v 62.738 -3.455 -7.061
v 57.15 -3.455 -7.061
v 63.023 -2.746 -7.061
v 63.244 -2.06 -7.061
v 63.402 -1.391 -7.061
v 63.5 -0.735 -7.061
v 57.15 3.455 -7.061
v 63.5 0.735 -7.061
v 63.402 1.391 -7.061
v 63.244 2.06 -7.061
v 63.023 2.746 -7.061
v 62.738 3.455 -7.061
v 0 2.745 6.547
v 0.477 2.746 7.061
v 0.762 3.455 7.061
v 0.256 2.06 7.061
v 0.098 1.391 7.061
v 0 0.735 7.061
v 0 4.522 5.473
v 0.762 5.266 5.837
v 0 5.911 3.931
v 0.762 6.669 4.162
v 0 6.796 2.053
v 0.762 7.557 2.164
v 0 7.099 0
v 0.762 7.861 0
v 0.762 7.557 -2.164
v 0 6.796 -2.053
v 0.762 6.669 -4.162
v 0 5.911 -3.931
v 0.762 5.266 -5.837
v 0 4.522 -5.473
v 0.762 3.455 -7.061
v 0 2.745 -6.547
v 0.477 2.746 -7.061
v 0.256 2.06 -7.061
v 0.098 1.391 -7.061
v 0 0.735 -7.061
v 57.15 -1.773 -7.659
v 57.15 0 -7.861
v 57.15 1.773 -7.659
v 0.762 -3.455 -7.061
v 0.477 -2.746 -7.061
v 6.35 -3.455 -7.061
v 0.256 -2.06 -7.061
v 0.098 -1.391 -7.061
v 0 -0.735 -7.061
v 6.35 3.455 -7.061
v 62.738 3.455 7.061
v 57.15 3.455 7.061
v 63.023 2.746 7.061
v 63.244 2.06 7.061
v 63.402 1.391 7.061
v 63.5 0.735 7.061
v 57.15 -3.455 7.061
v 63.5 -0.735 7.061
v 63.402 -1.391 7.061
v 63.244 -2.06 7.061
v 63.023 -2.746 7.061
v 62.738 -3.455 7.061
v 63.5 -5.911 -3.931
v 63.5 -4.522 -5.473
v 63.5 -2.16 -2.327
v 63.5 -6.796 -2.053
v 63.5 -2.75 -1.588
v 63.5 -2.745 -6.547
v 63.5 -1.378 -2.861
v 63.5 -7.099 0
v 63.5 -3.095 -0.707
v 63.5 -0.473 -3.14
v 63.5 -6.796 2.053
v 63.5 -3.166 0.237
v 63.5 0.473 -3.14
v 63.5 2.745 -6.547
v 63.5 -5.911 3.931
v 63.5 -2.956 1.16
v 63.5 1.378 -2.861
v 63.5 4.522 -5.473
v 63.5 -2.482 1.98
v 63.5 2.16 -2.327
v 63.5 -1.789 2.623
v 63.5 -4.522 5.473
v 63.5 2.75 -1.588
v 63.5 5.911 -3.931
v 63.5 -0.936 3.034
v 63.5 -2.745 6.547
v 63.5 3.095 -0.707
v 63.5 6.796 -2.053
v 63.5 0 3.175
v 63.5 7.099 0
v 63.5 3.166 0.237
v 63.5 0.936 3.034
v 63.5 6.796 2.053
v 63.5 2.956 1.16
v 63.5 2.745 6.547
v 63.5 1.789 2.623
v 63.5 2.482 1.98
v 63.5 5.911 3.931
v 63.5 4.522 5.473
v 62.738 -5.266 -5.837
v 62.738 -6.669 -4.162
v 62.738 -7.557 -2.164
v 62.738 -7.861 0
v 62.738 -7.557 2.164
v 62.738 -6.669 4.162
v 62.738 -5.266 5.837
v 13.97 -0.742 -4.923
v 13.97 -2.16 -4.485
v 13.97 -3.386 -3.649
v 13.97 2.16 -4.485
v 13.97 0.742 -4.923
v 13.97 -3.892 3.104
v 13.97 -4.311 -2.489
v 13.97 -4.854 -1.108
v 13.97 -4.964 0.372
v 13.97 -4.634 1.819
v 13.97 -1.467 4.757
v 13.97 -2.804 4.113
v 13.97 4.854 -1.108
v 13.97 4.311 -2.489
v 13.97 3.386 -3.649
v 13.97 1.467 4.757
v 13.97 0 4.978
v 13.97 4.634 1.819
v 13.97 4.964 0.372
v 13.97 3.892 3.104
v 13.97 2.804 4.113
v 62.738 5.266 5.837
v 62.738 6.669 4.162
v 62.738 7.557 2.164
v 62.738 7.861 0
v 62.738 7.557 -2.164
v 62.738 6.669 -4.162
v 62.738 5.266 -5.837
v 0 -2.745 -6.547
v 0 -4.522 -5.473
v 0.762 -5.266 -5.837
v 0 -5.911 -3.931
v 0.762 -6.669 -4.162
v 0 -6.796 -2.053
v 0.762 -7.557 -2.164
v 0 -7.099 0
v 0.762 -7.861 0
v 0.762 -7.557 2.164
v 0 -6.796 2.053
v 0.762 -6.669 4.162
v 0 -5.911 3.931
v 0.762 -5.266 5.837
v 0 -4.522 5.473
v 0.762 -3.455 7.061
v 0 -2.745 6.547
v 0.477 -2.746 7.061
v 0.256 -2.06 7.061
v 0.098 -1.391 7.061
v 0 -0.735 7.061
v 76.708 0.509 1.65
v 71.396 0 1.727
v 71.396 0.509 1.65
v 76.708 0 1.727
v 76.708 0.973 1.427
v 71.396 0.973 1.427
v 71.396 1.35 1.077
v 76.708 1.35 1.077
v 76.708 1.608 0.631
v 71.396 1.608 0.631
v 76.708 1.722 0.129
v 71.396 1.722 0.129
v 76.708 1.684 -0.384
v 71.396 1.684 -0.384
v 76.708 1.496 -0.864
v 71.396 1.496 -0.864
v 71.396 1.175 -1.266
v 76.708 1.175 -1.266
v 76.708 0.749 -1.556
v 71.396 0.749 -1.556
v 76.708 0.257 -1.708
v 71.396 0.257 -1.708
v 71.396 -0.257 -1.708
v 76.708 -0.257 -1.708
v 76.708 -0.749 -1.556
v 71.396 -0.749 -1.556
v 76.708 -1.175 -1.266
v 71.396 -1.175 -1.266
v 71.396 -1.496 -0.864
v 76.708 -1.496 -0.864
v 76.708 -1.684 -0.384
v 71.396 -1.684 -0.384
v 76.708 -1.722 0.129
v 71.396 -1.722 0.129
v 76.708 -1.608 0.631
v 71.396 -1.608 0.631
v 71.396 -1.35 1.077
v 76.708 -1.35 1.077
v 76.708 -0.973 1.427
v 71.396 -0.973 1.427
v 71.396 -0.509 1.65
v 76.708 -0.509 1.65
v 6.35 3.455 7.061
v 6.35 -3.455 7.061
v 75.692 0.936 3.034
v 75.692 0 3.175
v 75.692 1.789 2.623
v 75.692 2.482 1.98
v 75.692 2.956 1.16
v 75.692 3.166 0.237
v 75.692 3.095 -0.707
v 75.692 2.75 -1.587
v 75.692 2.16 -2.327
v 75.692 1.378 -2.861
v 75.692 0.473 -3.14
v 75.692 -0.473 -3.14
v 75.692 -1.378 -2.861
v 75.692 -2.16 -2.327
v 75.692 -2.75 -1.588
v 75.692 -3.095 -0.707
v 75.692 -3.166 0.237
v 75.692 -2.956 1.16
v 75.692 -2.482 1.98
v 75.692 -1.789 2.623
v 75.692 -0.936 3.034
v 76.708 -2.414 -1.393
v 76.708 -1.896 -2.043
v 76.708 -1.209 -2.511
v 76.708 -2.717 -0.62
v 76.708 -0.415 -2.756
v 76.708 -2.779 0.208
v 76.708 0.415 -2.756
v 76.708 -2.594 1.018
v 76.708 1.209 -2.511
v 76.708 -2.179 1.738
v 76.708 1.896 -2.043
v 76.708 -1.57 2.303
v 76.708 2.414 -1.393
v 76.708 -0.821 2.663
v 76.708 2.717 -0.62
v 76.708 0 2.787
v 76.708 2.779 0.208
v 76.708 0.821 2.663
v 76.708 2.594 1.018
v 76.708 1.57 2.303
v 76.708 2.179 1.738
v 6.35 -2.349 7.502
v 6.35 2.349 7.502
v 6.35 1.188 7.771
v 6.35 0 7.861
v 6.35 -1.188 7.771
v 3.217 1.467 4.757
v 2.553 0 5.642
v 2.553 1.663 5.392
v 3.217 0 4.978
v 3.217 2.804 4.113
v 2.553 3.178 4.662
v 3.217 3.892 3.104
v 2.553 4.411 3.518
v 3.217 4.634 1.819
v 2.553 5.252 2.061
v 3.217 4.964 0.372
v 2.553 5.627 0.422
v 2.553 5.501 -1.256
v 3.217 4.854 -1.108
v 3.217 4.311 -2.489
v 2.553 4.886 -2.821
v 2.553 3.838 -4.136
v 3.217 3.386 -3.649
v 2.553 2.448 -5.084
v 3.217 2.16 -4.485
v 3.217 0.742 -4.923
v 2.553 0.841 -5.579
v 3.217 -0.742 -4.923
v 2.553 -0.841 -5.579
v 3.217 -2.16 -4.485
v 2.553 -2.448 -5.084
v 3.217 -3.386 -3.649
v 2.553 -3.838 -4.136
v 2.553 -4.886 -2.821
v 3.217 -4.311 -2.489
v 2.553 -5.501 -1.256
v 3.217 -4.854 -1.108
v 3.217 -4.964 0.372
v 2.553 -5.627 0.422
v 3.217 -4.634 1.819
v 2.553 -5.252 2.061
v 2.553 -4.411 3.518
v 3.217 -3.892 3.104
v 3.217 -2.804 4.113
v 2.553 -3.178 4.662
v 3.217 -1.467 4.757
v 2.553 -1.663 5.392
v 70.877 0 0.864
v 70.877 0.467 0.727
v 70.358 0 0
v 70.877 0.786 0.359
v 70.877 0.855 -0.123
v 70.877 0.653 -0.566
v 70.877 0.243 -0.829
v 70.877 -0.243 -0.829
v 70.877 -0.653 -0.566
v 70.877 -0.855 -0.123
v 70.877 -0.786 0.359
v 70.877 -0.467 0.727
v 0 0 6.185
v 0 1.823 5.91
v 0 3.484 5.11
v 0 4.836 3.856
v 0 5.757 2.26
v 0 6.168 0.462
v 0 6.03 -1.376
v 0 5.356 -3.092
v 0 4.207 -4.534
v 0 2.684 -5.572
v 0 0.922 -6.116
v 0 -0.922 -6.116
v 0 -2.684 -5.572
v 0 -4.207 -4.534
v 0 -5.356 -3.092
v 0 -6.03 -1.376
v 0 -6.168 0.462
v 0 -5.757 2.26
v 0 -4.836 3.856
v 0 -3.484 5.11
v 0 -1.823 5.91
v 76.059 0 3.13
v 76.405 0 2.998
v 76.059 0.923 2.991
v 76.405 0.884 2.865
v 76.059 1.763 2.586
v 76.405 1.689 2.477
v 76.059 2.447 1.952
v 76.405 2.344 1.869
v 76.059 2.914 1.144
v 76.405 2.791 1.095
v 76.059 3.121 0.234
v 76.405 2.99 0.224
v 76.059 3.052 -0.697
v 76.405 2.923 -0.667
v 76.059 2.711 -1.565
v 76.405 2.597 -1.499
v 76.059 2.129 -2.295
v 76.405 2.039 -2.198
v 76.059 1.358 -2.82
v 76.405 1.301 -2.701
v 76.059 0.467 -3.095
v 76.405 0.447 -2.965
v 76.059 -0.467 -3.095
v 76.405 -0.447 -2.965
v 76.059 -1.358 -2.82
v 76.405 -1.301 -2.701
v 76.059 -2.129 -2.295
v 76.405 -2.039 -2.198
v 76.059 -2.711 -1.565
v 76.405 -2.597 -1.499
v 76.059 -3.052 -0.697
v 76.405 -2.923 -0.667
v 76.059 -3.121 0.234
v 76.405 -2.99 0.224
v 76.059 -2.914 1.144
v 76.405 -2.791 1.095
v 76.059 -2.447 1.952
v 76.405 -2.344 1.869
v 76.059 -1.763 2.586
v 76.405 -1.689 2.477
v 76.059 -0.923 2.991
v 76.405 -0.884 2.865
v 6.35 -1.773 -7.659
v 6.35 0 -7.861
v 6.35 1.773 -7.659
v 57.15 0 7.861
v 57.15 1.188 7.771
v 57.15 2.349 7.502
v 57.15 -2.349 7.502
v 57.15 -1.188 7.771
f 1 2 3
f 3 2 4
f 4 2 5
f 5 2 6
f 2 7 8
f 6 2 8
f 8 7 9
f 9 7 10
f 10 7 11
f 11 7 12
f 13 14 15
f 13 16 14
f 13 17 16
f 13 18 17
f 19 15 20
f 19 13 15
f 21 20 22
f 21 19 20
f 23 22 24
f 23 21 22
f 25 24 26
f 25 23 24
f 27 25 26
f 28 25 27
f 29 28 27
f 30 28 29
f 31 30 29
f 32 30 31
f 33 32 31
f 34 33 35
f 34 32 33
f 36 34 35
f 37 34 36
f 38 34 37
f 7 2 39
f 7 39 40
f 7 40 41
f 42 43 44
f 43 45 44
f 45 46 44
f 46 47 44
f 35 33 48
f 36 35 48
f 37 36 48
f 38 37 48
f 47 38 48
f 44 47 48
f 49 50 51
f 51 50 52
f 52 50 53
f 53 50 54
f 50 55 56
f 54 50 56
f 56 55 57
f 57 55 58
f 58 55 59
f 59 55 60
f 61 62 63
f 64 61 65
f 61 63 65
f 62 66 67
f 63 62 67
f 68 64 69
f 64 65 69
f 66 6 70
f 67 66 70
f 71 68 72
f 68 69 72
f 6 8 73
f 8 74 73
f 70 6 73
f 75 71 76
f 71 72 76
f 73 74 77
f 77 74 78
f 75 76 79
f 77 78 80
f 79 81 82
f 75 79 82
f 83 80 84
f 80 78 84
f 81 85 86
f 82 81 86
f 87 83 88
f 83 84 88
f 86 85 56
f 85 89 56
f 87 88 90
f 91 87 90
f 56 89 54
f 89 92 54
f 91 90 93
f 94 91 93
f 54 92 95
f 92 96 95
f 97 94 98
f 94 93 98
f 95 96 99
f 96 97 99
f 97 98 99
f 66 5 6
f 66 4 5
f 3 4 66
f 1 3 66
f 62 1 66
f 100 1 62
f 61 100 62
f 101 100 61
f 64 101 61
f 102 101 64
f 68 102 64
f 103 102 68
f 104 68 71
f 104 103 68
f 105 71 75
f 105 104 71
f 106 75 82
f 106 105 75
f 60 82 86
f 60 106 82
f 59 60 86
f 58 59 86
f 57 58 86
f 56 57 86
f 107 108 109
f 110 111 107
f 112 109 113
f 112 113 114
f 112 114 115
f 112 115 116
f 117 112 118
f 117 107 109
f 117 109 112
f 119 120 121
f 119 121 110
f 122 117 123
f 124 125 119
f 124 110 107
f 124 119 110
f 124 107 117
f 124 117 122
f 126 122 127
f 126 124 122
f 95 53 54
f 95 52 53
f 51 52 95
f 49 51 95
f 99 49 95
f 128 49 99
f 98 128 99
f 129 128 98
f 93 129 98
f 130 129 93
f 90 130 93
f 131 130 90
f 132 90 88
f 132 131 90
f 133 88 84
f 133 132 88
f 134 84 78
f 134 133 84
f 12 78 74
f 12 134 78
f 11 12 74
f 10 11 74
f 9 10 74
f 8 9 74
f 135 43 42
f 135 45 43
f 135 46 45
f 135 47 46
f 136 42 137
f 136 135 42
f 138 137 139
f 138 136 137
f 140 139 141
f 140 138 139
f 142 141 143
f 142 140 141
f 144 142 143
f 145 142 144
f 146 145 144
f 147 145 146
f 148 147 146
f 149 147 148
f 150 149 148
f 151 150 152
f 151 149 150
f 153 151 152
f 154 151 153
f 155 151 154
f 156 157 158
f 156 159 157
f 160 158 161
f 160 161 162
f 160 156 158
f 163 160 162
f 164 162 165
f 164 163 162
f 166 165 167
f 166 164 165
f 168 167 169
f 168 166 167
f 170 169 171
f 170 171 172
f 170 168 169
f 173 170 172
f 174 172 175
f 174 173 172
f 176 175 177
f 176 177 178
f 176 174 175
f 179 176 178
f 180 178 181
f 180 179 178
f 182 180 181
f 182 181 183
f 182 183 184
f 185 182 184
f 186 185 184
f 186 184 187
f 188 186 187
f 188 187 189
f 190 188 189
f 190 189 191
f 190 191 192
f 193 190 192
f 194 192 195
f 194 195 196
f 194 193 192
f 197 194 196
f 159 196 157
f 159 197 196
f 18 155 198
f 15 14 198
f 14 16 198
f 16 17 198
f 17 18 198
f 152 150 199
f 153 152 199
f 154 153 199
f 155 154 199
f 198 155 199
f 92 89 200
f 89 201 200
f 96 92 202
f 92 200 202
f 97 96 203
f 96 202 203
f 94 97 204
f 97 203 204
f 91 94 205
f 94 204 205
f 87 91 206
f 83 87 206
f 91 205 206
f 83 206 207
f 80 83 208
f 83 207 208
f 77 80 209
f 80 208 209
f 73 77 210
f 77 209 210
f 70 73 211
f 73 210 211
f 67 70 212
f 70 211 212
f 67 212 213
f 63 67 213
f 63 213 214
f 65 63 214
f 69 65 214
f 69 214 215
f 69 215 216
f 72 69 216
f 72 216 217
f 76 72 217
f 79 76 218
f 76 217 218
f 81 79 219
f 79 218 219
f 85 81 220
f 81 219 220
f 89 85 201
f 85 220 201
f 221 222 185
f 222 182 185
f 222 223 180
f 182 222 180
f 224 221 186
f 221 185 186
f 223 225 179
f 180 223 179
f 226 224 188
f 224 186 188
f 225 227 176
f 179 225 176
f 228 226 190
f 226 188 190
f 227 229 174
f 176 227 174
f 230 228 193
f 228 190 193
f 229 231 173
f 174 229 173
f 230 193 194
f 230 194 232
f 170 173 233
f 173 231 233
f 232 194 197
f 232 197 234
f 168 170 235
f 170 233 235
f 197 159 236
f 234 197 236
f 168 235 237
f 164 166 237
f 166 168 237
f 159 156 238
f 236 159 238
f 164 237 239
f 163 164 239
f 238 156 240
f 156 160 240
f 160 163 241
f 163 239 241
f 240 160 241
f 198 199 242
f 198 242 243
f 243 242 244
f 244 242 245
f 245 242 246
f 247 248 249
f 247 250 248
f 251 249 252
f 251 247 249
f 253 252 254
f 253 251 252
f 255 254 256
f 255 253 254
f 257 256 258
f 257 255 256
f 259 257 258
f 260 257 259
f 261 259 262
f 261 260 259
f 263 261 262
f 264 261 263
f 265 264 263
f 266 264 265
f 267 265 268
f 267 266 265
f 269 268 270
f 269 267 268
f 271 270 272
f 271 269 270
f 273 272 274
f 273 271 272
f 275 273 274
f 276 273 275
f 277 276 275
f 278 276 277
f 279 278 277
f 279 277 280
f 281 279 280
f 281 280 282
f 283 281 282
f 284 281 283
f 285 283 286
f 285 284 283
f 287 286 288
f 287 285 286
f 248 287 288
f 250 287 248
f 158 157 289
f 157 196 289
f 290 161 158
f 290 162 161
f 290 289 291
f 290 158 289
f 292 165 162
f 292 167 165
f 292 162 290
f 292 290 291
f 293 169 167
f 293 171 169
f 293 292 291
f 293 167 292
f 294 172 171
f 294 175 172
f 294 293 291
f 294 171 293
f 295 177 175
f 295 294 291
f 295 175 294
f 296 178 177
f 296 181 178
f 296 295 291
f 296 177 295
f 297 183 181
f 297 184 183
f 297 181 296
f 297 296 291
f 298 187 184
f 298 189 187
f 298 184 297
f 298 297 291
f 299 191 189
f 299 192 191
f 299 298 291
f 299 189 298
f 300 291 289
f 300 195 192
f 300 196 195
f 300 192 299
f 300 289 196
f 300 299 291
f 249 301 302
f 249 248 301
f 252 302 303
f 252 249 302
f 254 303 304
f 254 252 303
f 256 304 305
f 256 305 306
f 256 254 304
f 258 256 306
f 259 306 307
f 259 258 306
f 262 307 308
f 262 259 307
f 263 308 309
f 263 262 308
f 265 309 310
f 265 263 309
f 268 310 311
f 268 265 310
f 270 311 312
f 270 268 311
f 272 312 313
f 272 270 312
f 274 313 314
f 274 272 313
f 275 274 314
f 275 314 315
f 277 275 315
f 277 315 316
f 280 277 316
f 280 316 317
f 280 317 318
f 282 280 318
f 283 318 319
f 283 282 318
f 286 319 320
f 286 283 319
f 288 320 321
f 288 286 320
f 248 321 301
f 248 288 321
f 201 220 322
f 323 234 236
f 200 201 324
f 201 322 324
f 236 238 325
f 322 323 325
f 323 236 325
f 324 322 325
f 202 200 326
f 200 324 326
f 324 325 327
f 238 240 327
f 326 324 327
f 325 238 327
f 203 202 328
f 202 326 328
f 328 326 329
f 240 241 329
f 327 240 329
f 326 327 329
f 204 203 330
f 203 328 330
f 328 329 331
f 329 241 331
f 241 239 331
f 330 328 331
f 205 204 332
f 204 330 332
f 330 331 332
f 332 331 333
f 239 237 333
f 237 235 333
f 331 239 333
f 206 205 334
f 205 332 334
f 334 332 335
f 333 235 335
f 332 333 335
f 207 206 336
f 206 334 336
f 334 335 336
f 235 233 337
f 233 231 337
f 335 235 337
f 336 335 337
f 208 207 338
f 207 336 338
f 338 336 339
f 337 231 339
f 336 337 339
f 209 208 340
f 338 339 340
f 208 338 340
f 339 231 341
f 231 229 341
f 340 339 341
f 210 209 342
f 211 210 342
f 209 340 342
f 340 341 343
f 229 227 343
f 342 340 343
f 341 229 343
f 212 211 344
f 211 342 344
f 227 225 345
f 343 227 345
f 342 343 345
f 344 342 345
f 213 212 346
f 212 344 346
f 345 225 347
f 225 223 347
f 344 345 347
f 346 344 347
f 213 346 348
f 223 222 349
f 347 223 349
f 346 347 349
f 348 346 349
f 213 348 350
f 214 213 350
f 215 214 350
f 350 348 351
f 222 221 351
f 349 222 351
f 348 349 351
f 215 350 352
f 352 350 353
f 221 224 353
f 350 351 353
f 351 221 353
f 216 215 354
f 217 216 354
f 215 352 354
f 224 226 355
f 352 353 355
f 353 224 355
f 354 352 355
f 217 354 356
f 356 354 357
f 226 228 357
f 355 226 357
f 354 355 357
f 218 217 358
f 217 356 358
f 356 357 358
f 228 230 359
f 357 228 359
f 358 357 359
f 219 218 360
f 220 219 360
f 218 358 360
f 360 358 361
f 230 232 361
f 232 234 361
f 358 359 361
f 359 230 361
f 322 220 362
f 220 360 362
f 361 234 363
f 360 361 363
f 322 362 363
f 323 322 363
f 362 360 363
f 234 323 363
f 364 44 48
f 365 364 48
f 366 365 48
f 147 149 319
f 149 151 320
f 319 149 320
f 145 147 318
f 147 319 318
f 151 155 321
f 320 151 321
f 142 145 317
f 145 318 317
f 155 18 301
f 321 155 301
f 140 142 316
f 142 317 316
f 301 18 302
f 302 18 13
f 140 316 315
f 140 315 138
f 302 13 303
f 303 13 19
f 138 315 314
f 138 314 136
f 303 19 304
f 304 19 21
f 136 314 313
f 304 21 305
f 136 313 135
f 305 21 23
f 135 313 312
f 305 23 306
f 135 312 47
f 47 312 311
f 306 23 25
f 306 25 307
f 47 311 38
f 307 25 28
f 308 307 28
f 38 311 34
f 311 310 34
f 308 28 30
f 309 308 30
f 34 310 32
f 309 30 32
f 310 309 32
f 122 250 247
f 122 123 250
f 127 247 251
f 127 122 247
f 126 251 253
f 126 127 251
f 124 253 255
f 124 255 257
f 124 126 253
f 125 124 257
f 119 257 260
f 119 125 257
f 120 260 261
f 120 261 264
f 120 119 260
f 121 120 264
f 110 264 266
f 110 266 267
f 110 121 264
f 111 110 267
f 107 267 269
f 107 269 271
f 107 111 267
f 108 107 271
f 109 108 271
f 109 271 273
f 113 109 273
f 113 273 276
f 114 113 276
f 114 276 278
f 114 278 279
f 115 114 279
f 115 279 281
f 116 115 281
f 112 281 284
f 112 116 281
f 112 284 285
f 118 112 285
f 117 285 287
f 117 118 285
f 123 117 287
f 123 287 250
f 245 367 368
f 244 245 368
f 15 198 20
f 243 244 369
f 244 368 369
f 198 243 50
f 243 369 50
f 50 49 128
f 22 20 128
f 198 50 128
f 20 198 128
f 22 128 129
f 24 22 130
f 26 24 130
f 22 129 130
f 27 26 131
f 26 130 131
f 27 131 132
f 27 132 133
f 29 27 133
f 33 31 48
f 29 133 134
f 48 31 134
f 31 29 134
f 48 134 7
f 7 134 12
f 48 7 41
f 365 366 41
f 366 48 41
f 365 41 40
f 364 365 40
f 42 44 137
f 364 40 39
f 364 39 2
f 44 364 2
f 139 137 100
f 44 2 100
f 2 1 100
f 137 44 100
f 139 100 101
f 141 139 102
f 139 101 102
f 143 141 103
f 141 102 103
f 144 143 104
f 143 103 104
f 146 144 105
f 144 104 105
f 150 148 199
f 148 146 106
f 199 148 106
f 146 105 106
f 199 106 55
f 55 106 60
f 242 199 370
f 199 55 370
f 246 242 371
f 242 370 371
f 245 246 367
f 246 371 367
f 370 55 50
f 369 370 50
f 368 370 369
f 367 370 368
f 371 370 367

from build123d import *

# Parameters (mm, degrees)
CHAMFER1_SIZE           = 0.762
SKETCH5_W               = 6.35
SKETCH5_H               = 0.8001
CUT_EXTRUDE1_DEPTH      = 8.8613
CUT_EXTRUDE1_DEPTH_BACK = 8.8613
SKETCH6_W               = 6.35
SKETCH6_H               = 0.8001
CUT_EXTRUDE2_DEPTH      = 8.8613
CUT_EXTRUDE2_DEPTH_BACK = 8.8613


with BuildPart() as part:
    # Sketch1 → Revolve1 (revolve)
    with BuildSketch(Plane(origin=(0, 0, 0), x_dir=(-1, 0, 0), z_dir=(0, 0, -1)), mode=Mode.PRIVATE) as revolve1_sk:
        with BuildLine():
            Line((-76.708, 2.786922533), (-76.708, 0))
            Line((-76.708, 0), (0, 0))
            Line((0, 0), (0, 7.8613))
            Line((0, 7.8613), (-63.5, 7.8613))
            Line((-63.5, 7.8613), (-63.5, 3.175))
            Line((-63.5, 3.175), (-75.692, 3.175))
            ThreePointArc((-75.692, 3.175), (-76.235796865, 3.074678675), (-76.708, 2.786922533))
        make_face()
    revolve(revolve1_sk.sketch.rotate(Axis((76.708, 0, 0), (-1, 0, 0)), 270), axis=Axis((76.708, 0, 0), (-1, 0, 0)))  # turned: the seam where the file's is

    # Sketch2 → Cut-Revolve1 (revolve, cut)
    with BuildSketch(Plane(origin=(0, 0, 0), x_dir=(-1, 0, 0), z_dir=(0, 0, -1)), mode=Mode.PRIVATE) as cut_revolve1_sk:
        Polygon((-13.97, 4.9784), (-13.97, 0), (0, 0), (0, 6.1849), (-2.5527, 5.642306865), (-3.216606865, 4.9784), align=None)
    revolve(cut_revolve1_sk.sketch.rotate(Axis((13.97, 0, 0), (-1, 0, 0)), 270), axis=Axis((13.97, 0, 0), (-1, 0, 0)), mode=Mode.SUBTRACT)  # turned: the seam where the file's is

    # Sketch3 → Cut-Revolve2 (revolve, cut)
    with BuildSketch(Plane(origin=(0, 0, 0), x_dir=(-1, 0, 0), z_dir=(0, 0, -1)), mode=Mode.PRIVATE) as cut_revolve2_sk:
        Polygon((-76.708, 1.7272), (-76.708, 0), (-70.358, 0), (-71.395806461, 1.7272), align=None)
    revolve(cut_revolve2_sk.sketch.rotate(Axis((66.313858967, 0, 0), (-1, 0, 0)), 270), axis=Axis((66.313858967, 0, 0), (-1, 0, 0)), mode=Mode.SUBTRACT)  # turned: the seam where the file's is

    # Chamfer1
    chamfer1_edges = [part.edges().sort_by_distance(p)[0] for p in [
        (63.5, 0, -7.8613),
        (0, 0, -7.8613),
    ]]
    chamfer(chamfer1_edges, length=CHAMFER1_SIZE)

    # Sketch5 → Cut-Extrude1 (cut, two sides)
    with BuildSketch(Plane(origin=(0, 0, 0), x_dir=(1, 0, 0), z_dir=(0, 1, 0))) as cut_extrude1_sk:
        with Locations((3.175, 7.46125)):
            Rectangle(SKETCH5_W, SKETCH5_H)
        with Locations((3.175, -7.46125)):
            Rectangle(SKETCH5_W, SKETCH5_H)
    extrude(amount=CUT_EXTRUDE1_DEPTH, mode=Mode.SUBTRACT)
    extrude(cut_extrude1_sk.sketch, amount=-CUT_EXTRUDE1_DEPTH_BACK, mode=Mode.SUBTRACT)

    # Sketch6 → Cut-Extrude2 (cut, two sides)
    with BuildSketch(Plane(origin=(0, 0, 0), x_dir=(1, 0, 0), z_dir=(0, 1, 0))) as cut_extrude2_sk:
        with Locations((60.325, 7.46125)):
            Rectangle(SKETCH6_W, SKETCH6_H)
        with Locations((60.325, -7.46125)):
            Rectangle(SKETCH6_W, SKETCH6_H)
    extrude(amount=CUT_EXTRUDE2_DEPTH, mode=Mode.SUBTRACT)
    extrude(cut_extrude2_sk.sketch, amount=-CUT_EXTRUDE2_DEPTH_BACK, mode=Mode.SUBTRACT)


solid = part.part
